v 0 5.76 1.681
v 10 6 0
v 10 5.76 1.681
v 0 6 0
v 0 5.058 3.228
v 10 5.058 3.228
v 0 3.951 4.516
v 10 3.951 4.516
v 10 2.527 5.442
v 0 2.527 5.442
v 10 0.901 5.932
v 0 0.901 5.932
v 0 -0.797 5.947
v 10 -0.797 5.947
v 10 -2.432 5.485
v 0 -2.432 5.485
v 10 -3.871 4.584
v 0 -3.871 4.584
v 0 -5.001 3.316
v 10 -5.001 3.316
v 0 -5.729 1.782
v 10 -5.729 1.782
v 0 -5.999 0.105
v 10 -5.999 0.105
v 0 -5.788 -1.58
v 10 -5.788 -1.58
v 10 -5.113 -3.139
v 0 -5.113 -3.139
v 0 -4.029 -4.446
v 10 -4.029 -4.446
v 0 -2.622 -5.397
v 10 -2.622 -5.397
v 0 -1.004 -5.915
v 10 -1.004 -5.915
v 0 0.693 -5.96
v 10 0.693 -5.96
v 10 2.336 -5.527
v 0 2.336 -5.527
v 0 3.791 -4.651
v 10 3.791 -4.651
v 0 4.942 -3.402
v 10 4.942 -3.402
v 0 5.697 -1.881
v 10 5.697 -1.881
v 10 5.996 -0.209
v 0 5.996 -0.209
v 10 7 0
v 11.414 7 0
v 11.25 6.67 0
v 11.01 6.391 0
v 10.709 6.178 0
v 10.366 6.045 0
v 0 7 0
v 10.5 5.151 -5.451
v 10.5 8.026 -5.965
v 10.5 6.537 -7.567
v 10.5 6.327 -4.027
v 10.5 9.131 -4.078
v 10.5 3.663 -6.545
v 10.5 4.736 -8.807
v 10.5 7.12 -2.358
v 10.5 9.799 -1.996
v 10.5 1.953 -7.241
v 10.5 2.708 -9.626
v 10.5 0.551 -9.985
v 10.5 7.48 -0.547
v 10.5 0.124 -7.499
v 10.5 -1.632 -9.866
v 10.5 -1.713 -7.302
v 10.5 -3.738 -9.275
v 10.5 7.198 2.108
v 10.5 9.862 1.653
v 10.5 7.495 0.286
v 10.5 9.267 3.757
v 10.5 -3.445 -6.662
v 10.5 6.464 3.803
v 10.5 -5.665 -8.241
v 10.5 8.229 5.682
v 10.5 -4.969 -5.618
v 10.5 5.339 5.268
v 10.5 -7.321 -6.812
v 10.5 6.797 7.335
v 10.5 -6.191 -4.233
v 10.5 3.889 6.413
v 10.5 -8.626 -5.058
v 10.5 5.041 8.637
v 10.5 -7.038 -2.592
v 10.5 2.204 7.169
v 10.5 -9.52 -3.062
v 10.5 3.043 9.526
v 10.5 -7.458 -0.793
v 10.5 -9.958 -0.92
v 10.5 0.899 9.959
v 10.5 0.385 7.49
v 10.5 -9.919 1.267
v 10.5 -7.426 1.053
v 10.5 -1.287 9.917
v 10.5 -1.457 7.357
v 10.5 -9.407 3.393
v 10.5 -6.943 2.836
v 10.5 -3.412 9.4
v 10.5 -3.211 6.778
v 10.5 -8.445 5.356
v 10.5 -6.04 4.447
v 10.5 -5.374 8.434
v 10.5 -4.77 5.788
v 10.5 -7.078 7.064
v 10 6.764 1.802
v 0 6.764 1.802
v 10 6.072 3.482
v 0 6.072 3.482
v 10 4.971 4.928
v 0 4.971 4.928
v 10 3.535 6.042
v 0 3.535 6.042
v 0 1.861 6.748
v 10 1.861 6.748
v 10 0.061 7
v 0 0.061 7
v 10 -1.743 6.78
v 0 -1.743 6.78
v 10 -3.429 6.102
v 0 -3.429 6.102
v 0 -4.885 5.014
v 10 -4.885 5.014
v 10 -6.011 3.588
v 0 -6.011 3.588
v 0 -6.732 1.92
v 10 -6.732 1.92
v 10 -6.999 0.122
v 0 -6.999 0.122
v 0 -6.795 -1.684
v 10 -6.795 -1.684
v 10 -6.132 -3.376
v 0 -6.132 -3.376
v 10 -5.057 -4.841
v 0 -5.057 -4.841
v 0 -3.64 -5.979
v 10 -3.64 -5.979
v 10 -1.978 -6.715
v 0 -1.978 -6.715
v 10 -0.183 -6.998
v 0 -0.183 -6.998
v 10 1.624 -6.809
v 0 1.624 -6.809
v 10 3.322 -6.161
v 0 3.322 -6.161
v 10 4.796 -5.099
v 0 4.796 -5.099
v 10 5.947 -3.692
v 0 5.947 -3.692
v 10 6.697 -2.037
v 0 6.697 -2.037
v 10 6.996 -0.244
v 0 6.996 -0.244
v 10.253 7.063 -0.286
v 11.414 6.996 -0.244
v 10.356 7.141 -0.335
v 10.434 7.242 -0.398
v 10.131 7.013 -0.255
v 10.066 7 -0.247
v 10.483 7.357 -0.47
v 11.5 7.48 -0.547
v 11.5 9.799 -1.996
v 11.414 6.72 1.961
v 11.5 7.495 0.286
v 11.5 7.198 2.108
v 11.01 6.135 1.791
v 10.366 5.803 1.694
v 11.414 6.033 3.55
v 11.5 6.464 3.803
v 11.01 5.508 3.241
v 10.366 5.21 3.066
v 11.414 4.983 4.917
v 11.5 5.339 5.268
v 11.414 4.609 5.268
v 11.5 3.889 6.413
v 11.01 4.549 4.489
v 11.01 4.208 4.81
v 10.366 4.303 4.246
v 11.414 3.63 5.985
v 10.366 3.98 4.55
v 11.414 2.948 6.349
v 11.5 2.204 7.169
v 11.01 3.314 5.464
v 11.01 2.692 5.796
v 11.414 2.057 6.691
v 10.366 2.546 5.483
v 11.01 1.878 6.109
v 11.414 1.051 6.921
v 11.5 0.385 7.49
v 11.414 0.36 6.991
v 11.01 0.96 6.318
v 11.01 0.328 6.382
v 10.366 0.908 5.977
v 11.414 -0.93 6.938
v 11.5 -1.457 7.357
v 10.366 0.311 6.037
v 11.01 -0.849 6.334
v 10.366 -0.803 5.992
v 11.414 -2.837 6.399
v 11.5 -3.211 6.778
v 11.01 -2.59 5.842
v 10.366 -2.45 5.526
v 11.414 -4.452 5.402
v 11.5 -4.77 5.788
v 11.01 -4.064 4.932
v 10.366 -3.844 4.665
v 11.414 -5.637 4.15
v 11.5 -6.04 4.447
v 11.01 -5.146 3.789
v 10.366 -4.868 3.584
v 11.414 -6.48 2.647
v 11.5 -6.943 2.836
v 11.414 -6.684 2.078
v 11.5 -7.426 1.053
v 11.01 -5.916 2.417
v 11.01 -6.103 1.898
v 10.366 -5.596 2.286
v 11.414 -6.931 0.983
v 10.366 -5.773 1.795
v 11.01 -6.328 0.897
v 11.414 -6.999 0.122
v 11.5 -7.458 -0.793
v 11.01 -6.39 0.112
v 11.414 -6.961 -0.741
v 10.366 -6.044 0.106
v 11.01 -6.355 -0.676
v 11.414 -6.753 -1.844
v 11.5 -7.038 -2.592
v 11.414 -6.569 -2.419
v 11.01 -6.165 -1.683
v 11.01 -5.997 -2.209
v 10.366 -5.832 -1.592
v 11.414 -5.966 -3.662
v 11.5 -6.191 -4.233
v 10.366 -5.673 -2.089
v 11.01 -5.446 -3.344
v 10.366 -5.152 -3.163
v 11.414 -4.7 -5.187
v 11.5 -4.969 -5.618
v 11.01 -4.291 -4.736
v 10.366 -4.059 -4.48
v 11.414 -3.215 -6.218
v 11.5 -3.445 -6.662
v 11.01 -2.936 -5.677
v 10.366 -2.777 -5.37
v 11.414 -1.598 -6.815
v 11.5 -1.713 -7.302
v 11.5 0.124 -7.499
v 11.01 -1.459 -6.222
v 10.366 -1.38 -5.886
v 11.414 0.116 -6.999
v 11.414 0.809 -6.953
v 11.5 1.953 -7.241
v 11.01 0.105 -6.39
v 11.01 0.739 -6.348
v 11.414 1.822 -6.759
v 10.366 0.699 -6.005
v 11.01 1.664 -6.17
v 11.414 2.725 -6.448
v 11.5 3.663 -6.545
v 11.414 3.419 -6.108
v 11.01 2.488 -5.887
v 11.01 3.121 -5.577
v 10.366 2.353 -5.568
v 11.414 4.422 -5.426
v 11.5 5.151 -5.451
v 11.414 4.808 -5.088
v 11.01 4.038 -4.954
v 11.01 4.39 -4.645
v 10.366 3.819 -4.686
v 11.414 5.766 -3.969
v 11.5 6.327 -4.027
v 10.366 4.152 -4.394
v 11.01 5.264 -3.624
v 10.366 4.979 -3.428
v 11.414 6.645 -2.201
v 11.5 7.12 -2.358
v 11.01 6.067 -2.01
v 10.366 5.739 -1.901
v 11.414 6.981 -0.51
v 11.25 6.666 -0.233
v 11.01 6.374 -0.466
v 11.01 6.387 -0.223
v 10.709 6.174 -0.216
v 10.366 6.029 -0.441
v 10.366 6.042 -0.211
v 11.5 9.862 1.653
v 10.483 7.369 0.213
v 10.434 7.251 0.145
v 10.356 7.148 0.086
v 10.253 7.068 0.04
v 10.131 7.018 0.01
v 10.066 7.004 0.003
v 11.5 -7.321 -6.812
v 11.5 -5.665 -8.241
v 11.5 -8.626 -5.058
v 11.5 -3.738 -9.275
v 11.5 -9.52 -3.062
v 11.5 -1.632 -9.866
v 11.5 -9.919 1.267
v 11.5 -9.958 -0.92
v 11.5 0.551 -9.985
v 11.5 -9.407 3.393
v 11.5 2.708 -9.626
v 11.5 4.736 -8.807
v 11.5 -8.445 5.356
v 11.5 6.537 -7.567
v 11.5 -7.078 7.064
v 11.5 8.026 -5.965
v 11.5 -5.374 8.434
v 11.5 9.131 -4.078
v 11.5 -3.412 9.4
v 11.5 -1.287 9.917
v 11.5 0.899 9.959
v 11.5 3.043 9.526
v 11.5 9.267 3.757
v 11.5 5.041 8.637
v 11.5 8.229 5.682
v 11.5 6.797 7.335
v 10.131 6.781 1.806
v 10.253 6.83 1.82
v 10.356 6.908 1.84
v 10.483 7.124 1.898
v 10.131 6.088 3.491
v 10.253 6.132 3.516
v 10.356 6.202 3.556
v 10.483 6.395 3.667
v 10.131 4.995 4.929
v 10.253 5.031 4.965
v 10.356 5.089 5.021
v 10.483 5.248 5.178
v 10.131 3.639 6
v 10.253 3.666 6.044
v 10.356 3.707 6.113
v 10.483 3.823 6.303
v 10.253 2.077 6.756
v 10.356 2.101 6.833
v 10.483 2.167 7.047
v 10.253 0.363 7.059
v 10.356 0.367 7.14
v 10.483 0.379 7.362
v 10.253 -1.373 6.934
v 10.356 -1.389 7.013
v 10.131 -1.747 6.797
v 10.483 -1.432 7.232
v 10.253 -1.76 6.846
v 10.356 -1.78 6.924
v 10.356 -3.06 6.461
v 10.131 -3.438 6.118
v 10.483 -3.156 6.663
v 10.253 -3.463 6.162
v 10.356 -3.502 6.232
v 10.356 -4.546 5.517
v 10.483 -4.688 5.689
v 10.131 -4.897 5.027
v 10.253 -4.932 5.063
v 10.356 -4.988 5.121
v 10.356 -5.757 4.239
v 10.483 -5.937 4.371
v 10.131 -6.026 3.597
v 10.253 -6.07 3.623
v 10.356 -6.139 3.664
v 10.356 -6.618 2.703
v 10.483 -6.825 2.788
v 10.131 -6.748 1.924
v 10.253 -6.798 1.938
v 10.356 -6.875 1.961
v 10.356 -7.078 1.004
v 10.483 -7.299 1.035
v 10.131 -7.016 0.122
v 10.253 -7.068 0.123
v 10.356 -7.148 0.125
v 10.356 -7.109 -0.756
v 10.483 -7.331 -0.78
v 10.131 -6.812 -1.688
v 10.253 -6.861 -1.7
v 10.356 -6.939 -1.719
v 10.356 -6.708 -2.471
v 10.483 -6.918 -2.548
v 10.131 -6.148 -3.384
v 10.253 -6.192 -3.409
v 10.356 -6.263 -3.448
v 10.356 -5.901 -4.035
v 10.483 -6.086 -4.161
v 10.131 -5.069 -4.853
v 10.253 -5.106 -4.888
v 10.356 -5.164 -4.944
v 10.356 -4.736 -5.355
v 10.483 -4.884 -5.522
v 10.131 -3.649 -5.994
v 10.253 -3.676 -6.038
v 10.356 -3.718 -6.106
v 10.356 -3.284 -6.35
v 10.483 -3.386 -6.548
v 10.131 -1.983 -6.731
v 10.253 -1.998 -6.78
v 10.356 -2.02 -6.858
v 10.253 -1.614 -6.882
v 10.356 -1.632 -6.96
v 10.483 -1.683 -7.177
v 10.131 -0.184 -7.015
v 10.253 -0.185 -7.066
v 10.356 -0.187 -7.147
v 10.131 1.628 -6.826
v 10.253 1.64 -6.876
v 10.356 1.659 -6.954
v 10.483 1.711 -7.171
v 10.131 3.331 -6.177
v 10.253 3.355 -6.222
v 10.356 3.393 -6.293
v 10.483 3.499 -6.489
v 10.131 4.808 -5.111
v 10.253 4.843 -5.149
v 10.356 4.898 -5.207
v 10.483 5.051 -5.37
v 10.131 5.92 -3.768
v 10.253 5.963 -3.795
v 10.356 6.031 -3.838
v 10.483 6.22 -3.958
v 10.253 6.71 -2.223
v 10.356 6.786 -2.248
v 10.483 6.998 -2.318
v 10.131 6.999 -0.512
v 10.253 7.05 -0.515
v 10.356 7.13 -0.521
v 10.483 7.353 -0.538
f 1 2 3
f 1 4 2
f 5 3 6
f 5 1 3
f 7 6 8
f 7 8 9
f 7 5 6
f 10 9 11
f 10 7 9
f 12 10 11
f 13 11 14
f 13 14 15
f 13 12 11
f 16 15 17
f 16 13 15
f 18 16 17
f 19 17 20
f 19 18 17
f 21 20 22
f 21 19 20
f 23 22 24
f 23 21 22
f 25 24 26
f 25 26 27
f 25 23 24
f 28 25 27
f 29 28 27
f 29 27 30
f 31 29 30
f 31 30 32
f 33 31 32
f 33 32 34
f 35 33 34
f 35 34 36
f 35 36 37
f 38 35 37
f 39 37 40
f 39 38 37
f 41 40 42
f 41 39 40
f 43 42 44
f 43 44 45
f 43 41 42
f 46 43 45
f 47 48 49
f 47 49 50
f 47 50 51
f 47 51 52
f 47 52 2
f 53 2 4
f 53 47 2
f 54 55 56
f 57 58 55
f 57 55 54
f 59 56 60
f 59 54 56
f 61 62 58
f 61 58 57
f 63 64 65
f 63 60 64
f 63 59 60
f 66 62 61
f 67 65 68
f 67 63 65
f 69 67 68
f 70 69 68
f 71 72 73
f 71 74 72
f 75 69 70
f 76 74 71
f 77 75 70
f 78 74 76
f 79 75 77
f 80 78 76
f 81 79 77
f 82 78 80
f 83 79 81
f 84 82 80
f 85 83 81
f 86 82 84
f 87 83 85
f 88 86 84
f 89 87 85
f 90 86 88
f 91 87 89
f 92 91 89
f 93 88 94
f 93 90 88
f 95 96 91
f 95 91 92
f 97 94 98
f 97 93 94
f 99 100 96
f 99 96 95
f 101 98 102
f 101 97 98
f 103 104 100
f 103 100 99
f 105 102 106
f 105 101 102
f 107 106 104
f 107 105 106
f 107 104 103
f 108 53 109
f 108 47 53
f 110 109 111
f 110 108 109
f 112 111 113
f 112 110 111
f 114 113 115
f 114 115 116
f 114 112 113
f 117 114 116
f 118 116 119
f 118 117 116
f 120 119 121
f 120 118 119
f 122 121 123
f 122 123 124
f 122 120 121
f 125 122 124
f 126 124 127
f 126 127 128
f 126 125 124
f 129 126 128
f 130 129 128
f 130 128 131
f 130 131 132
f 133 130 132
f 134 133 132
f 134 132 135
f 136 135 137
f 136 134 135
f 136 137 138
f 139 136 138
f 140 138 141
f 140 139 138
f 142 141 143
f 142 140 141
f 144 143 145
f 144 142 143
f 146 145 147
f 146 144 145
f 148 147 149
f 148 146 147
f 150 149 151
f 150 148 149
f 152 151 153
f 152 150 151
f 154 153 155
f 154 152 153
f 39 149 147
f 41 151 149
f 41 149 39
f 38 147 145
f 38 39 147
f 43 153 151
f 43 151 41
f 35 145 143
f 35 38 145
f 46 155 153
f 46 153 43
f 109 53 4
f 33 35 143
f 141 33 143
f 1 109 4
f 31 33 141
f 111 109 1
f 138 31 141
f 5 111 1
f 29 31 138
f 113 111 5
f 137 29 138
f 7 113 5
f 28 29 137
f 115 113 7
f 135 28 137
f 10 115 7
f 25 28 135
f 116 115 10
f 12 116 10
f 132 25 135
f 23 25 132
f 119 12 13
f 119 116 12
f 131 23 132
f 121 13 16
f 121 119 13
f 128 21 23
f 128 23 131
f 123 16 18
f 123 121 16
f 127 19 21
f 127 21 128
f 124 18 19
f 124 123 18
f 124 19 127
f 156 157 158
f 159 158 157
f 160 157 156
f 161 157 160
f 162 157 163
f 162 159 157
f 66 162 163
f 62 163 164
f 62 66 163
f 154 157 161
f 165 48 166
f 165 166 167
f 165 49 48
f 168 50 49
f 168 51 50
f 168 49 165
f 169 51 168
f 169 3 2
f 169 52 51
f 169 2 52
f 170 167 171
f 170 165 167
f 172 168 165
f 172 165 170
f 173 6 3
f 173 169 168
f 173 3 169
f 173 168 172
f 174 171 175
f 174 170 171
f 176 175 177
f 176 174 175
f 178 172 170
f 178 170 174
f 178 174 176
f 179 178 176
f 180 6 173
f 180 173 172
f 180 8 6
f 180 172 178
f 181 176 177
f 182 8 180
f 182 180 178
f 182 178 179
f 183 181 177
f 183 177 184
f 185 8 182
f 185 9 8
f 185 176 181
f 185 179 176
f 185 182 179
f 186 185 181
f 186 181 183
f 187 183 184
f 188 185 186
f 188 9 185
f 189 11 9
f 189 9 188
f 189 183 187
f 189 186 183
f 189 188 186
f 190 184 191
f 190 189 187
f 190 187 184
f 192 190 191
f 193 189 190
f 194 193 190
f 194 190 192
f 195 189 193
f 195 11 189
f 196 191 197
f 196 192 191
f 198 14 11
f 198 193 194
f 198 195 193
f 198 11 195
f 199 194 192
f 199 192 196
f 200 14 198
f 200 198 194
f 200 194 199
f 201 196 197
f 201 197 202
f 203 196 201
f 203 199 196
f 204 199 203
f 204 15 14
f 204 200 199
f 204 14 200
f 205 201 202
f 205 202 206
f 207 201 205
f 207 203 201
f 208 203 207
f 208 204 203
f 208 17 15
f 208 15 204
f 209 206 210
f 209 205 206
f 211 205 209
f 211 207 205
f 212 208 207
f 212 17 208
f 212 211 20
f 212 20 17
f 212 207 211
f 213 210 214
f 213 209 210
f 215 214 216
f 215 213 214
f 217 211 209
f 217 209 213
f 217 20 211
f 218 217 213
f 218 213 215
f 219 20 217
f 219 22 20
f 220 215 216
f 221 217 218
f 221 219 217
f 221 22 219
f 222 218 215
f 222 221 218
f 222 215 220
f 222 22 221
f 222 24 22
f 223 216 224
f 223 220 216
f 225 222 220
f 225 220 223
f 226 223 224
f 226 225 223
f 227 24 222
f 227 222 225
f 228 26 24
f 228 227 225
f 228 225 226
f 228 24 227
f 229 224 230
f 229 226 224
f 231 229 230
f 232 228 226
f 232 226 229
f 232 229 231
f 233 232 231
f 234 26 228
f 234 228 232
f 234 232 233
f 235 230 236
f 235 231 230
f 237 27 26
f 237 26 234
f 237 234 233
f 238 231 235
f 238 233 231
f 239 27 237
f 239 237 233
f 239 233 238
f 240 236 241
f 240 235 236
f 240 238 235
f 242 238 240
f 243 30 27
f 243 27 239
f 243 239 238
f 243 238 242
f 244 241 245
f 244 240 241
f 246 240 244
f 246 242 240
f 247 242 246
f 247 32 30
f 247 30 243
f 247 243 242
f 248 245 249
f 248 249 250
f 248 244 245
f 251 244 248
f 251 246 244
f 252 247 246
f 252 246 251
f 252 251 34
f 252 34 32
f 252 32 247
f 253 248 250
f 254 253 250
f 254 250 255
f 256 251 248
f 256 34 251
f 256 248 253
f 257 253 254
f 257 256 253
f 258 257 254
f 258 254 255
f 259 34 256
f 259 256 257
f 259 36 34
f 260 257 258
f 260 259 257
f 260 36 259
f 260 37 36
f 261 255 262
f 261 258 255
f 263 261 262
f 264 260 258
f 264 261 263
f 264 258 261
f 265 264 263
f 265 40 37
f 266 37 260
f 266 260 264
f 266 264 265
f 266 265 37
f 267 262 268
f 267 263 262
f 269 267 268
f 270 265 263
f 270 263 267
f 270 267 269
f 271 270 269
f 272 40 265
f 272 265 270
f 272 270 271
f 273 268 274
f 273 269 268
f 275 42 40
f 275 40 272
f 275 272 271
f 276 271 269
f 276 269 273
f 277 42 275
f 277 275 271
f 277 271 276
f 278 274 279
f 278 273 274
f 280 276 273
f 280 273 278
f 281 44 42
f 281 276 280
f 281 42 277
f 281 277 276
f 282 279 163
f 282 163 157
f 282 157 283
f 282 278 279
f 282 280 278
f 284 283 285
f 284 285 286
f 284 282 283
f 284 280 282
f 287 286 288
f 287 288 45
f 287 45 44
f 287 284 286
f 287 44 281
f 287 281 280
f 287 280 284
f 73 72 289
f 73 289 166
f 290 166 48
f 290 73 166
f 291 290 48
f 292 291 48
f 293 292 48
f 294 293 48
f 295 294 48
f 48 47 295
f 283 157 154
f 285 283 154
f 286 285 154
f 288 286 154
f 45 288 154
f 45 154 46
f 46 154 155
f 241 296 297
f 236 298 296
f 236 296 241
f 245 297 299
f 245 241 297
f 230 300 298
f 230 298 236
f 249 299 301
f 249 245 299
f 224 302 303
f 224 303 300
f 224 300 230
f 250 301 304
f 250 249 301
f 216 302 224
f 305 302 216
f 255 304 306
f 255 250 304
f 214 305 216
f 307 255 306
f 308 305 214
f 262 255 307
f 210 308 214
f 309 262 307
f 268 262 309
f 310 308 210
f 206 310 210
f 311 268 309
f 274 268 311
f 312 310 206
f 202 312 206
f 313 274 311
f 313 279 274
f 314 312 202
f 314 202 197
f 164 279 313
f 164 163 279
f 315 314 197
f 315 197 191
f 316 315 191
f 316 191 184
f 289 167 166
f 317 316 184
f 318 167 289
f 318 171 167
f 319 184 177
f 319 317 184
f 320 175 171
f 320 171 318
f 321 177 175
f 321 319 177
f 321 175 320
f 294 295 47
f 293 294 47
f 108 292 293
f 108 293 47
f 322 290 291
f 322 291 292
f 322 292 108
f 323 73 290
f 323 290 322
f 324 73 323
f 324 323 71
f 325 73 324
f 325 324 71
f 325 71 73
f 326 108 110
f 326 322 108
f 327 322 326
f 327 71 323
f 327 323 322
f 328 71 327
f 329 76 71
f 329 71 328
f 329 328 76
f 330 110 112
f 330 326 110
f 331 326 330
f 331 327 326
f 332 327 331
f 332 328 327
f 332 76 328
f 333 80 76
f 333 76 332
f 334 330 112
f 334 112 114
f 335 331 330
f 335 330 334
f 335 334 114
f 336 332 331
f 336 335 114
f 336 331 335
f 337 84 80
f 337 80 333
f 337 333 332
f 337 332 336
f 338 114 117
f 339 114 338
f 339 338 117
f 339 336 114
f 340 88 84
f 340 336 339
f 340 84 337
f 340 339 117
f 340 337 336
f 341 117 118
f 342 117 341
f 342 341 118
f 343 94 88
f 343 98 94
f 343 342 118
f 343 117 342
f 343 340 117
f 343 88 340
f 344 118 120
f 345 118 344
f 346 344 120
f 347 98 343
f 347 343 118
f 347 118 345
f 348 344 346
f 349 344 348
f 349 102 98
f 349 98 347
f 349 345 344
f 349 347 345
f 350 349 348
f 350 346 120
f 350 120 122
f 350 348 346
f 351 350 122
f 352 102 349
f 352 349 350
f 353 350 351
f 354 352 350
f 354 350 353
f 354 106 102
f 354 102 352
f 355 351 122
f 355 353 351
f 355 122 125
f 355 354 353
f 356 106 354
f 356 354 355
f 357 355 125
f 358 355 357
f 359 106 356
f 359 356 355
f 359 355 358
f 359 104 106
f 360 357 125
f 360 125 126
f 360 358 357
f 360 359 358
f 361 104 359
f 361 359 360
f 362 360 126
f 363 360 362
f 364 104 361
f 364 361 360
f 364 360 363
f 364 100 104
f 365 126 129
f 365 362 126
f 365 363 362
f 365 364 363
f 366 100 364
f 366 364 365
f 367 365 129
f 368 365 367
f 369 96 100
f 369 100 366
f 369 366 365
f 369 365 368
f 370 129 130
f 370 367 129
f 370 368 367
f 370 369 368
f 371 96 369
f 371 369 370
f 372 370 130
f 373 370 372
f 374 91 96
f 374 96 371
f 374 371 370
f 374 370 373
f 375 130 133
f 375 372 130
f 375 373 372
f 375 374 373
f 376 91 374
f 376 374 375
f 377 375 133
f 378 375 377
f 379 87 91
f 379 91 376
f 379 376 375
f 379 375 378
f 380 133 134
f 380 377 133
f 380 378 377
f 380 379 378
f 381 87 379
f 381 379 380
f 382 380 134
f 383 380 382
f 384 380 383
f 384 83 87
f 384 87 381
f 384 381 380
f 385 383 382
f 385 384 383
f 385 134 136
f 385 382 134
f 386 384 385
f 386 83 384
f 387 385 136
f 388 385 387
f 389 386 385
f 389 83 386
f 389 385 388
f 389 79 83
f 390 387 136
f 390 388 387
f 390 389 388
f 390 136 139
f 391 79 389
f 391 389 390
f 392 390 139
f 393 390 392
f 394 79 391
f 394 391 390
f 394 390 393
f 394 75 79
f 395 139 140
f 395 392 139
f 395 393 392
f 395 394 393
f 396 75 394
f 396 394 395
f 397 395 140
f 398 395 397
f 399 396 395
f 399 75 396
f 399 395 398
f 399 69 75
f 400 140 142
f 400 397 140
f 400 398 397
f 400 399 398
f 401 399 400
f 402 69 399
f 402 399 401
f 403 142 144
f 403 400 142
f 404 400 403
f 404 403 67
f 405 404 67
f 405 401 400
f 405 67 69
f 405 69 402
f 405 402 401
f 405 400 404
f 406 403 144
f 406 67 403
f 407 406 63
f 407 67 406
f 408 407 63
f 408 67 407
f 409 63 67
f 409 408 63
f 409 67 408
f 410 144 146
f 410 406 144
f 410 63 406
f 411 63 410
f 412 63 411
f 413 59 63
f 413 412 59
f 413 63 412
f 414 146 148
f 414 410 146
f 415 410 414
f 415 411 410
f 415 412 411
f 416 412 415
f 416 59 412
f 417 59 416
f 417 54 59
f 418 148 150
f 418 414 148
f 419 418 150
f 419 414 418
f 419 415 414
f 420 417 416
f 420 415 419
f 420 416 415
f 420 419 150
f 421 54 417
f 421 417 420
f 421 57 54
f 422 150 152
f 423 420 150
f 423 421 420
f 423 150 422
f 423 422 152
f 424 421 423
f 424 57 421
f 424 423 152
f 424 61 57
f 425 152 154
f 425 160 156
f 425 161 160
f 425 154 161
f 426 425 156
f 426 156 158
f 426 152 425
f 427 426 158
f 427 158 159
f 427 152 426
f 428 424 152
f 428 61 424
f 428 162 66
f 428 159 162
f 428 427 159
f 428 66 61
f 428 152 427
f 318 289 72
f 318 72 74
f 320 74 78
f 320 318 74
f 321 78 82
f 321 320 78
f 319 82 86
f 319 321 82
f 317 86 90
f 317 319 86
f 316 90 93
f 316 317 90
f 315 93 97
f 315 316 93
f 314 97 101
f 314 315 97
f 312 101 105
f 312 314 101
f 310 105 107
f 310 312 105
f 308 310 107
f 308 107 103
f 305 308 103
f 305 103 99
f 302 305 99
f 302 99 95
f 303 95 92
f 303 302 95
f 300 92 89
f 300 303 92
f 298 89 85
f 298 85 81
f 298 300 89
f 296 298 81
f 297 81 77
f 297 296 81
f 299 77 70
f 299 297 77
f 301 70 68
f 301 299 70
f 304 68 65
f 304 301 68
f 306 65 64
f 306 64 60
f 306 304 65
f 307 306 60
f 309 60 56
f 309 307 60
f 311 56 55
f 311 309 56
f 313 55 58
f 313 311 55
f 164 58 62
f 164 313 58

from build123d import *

# Parameters (mm, degrees)
BASE_R_VOLUTION_ANGLE   = 358
ENL_V_MAT_EXTRU_3_DEPTH = 19.227726134


with BuildPart() as part:
    # Esquisse1 → Base-Révolution (revolve)
    with BuildSketch(Plane.XY):
        with BuildLine():
            Line((0, 7), (10, 7))
            ThreePointArc((10, 7), (10.353553391, 7.146446609), (10.5, 7.5))
            Line((10.5, 7.5), (10.5, 10))
            Line((10.5, 10), (11.5, 10))
            Line((11.5, 10), (11.5, 7.5))
            ThreePointArc((11.5, 7.5), (11.060660172, 6.439339828), (10, 6))
            Line((10, 6), (0, 6))
            Line((0, 6), (0, 7))
        make_face()
    revolve(axis=Axis((0, 0, 0), (1, 0, 0)), revolution_arc=BASE_R_VOLUTION_ANGLE)

    # Esquisse2 → Enlèv. mat.-Extru.3 (cut, through all)
    with BuildSketch(Plane(origin=(0, 0, 0), x_dir=(0, 0, -1), z_dir=(1, 0, 0))):
        Polygon((0.244296477, 6.995735789), (2.079990656, 9.933460569), (0.348994967, 9.99390827), (0, 10), (-1.732050808, 10), (0, 7), align=None)
    extrude(amount=ENL_V_MAT_EXTRU_3_DEPTH, mode=Mode.SUBTRACT)


solid = part.part
